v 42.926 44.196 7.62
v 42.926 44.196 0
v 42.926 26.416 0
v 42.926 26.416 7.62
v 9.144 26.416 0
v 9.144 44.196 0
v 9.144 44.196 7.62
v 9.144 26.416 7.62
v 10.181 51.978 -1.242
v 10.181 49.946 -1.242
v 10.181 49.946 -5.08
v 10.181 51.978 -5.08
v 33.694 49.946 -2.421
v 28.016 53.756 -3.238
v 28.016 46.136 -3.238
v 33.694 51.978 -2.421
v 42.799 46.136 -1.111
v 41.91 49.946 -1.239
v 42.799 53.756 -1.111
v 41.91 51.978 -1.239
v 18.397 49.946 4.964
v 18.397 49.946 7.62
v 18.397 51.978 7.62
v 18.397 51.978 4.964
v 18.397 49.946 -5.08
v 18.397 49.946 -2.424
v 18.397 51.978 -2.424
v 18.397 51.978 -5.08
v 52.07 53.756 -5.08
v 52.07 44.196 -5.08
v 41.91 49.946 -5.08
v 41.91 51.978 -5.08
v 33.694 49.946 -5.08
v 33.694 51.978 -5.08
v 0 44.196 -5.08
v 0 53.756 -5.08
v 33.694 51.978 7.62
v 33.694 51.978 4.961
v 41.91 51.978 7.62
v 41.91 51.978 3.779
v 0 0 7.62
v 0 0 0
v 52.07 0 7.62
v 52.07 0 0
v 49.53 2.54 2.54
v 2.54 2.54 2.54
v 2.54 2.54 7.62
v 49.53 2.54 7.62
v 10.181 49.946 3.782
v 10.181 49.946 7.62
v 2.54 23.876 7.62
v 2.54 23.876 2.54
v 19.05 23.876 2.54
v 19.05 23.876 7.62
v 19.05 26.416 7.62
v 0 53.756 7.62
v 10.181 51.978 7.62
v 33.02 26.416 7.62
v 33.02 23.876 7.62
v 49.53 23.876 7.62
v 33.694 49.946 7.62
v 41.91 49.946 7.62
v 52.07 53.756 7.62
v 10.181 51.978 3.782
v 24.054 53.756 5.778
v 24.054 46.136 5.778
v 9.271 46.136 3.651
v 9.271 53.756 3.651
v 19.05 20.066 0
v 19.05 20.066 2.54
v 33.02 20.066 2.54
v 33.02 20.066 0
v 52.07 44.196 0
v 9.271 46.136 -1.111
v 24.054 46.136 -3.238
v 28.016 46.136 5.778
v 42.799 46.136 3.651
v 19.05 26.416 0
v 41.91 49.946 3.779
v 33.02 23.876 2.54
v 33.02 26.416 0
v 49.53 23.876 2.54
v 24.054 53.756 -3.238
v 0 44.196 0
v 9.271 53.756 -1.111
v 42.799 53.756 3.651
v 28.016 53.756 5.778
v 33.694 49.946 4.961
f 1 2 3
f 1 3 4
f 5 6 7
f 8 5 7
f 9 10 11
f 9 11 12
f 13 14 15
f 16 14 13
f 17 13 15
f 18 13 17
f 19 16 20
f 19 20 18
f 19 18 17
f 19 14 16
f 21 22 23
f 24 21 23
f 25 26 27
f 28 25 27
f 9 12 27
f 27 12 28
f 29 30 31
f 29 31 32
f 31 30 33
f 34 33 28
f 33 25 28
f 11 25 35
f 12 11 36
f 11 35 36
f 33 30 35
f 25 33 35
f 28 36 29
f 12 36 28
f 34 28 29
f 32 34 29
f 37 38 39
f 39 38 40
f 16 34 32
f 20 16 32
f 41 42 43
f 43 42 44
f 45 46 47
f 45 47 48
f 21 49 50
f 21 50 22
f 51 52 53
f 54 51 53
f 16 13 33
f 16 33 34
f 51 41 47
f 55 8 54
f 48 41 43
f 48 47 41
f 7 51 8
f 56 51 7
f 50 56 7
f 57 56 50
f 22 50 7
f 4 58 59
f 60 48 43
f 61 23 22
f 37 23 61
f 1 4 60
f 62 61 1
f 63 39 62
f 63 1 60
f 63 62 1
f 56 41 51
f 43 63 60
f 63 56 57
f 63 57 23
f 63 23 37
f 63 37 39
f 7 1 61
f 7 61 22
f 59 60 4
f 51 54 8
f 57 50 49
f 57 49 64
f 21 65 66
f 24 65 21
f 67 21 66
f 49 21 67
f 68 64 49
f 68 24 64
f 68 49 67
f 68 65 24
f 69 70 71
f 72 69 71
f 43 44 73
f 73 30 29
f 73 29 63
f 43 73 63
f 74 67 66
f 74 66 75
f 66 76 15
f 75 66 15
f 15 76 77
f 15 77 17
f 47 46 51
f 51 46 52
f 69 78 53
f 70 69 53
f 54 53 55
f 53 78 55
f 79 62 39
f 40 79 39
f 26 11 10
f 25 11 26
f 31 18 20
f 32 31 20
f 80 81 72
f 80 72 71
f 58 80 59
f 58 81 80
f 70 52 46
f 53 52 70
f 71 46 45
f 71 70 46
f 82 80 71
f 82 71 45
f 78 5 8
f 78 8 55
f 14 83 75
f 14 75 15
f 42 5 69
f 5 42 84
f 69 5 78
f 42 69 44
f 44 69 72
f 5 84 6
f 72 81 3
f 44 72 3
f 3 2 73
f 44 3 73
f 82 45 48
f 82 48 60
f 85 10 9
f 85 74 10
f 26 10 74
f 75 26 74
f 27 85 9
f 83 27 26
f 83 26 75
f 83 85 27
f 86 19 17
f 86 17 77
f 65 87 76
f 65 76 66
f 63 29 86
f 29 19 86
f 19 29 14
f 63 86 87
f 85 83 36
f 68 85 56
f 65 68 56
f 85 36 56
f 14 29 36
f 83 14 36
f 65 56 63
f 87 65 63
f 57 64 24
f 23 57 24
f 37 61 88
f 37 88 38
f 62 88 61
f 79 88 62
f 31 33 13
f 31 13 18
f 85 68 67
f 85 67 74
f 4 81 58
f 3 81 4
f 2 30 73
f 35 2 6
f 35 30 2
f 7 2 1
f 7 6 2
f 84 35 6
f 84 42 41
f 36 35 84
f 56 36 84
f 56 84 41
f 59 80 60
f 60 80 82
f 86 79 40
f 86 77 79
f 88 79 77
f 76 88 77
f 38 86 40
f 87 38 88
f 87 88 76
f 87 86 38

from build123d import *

# Parameters (mm, degrees)
SKETCH1_W                       = 52.07
SKETCH1_H                       = 26.416
ULTRASONIC_HOLDER_EXTRUDE_DEPTH = 7.62
ULTRASONIC_CUTOUT_T             = -2.54
ULTRASONIC_WIRE_HOLE_DEPTH      = 6.35
ULTRASONIC_WIRE_HOLE_DEPTH_BACK = 12.7
ULTRASONIC_WIRE_HOLE_START      = -26.416
SKETCH2_W                       = 13.97
SKETCH2_H                       = 7.62
SKETCH7_W                       = 12.7
SKETCH7_H                       = 9.56038728
SERVO_HOLDER_DEPTH              = 52.07
SKETCH10_W                      = 9.144
SKETCH10_H                      = 7.62
CONNECTOR_DEPTH                 = 20.32
SERVO_CUTOUT_DEPTH              = 7.62
SERVO_SECURER_CUT_DEPTH         = 76.909973478
SERVO_SECURER_CUT_DEPTH_BACK    = 76.909973478
SKETCH15_W                      = 8.215827997
SKETCH15_H                      = 2.032


with BuildPart() as part:
    # Sketch1 → Ultrasonic Holder Extrude (new body)
    with BuildSketch(Plane.XY):
        with Locations((26.035, 13.208)):
            Rectangle(SKETCH1_W, SKETCH1_H)
    extrude(amount=ULTRASONIC_HOLDER_EXTRUDE_DEPTH)

    # Ultrasonic Cutout
    ultrasonic_cutout_openings = [part.faces().sort_by_distance(p)[0] for p in [
        (26.035, 13.208, 7.62),
    ]]
    offset(amount=ULTRASONIC_CUTOUT_T, openings=ultrasonic_cutout_openings, kind=Kind.INTERSECTION)

    # Sketch2 → Ultrasonic Wire Hole (cut, two sides: drawn at the far end of the back side and taken through both)
    with BuildSketch(Plane.XZ.offset(ULTRASONIC_WIRE_HOLE_START - ULTRASONIC_WIRE_HOLE_DEPTH_BACK)):
        with Locations((26.035, 3.81)):
            Rectangle(SKETCH2_W, SKETCH2_H)
    extrude(amount=ULTRASONIC_WIRE_HOLE_DEPTH + ULTRASONIC_WIRE_HOLE_DEPTH_BACK, mode=Mode.SUBTRACT)



with BuildPart() as body_2:
    # Sketch7 → Servo Holder (new, through all)
    with BuildSketch(Plane.ZY):
        with Locations((1.27, 48.97619364)):
            Rectangle(SKETCH7_W, SKETCH7_H)
    extrude(amount=-SERVO_HOLDER_DEPTH)


with BuildPart() as part_1:
    add(part.part)

    add(body_2.part)  # Connector merges body 2
    # Sketch10 → Connector (add)
    with BuildSketch(Plane.XZ.offset(-44.196)):
        with Locations((4.572, 3.81)):
            Rectangle(SKETCH10_W, SKETCH10_H)
        with Locations((47.498, 3.81)):
            Rectangle(SKETCH10_W, SKETCH10_H)
    extrude(amount=CONNECTOR_DEPTH)

    # Sketch14 → Servo Cutout (cut)
    with BuildSketch(Plane.ZX.offset(53.75638728)):
        Polygon((-1.11125, 42.799), (3.65125, 42.799), (5.7785, 28.0162), (5.7785, 24.0538), (3.65125, 9.271), (-1.11125, 9.271), (-3.2385, 24.0538), (-3.2385, 28.0162), align=None)
    extrude(amount=-SERVO_CUTOUT_DEPTH, mode=Mode.SUBTRACT)

    # Sketch15 → Servo Securer Cut (cut, two sides: drawn at the far end of the back side and taken through both)
    with BuildSketch(Plane.XY.offset(7.62).offset(-SERVO_SECURER_CUT_DEPTH_BACK)):
        with Locations((14.288933515, 50.96238728)):
            Rectangle(SKETCH15_W, SKETCH15_H)
        with Locations((37.802086002, 50.96238728)):
            Rectangle(SKETCH15_W, SKETCH15_H)
    extrude(amount=SERVO_SECURER_CUT_DEPTH + SERVO_SECURER_CUT_DEPTH_BACK, mode=Mode.SUBTRACT)


solid = part_1.part
